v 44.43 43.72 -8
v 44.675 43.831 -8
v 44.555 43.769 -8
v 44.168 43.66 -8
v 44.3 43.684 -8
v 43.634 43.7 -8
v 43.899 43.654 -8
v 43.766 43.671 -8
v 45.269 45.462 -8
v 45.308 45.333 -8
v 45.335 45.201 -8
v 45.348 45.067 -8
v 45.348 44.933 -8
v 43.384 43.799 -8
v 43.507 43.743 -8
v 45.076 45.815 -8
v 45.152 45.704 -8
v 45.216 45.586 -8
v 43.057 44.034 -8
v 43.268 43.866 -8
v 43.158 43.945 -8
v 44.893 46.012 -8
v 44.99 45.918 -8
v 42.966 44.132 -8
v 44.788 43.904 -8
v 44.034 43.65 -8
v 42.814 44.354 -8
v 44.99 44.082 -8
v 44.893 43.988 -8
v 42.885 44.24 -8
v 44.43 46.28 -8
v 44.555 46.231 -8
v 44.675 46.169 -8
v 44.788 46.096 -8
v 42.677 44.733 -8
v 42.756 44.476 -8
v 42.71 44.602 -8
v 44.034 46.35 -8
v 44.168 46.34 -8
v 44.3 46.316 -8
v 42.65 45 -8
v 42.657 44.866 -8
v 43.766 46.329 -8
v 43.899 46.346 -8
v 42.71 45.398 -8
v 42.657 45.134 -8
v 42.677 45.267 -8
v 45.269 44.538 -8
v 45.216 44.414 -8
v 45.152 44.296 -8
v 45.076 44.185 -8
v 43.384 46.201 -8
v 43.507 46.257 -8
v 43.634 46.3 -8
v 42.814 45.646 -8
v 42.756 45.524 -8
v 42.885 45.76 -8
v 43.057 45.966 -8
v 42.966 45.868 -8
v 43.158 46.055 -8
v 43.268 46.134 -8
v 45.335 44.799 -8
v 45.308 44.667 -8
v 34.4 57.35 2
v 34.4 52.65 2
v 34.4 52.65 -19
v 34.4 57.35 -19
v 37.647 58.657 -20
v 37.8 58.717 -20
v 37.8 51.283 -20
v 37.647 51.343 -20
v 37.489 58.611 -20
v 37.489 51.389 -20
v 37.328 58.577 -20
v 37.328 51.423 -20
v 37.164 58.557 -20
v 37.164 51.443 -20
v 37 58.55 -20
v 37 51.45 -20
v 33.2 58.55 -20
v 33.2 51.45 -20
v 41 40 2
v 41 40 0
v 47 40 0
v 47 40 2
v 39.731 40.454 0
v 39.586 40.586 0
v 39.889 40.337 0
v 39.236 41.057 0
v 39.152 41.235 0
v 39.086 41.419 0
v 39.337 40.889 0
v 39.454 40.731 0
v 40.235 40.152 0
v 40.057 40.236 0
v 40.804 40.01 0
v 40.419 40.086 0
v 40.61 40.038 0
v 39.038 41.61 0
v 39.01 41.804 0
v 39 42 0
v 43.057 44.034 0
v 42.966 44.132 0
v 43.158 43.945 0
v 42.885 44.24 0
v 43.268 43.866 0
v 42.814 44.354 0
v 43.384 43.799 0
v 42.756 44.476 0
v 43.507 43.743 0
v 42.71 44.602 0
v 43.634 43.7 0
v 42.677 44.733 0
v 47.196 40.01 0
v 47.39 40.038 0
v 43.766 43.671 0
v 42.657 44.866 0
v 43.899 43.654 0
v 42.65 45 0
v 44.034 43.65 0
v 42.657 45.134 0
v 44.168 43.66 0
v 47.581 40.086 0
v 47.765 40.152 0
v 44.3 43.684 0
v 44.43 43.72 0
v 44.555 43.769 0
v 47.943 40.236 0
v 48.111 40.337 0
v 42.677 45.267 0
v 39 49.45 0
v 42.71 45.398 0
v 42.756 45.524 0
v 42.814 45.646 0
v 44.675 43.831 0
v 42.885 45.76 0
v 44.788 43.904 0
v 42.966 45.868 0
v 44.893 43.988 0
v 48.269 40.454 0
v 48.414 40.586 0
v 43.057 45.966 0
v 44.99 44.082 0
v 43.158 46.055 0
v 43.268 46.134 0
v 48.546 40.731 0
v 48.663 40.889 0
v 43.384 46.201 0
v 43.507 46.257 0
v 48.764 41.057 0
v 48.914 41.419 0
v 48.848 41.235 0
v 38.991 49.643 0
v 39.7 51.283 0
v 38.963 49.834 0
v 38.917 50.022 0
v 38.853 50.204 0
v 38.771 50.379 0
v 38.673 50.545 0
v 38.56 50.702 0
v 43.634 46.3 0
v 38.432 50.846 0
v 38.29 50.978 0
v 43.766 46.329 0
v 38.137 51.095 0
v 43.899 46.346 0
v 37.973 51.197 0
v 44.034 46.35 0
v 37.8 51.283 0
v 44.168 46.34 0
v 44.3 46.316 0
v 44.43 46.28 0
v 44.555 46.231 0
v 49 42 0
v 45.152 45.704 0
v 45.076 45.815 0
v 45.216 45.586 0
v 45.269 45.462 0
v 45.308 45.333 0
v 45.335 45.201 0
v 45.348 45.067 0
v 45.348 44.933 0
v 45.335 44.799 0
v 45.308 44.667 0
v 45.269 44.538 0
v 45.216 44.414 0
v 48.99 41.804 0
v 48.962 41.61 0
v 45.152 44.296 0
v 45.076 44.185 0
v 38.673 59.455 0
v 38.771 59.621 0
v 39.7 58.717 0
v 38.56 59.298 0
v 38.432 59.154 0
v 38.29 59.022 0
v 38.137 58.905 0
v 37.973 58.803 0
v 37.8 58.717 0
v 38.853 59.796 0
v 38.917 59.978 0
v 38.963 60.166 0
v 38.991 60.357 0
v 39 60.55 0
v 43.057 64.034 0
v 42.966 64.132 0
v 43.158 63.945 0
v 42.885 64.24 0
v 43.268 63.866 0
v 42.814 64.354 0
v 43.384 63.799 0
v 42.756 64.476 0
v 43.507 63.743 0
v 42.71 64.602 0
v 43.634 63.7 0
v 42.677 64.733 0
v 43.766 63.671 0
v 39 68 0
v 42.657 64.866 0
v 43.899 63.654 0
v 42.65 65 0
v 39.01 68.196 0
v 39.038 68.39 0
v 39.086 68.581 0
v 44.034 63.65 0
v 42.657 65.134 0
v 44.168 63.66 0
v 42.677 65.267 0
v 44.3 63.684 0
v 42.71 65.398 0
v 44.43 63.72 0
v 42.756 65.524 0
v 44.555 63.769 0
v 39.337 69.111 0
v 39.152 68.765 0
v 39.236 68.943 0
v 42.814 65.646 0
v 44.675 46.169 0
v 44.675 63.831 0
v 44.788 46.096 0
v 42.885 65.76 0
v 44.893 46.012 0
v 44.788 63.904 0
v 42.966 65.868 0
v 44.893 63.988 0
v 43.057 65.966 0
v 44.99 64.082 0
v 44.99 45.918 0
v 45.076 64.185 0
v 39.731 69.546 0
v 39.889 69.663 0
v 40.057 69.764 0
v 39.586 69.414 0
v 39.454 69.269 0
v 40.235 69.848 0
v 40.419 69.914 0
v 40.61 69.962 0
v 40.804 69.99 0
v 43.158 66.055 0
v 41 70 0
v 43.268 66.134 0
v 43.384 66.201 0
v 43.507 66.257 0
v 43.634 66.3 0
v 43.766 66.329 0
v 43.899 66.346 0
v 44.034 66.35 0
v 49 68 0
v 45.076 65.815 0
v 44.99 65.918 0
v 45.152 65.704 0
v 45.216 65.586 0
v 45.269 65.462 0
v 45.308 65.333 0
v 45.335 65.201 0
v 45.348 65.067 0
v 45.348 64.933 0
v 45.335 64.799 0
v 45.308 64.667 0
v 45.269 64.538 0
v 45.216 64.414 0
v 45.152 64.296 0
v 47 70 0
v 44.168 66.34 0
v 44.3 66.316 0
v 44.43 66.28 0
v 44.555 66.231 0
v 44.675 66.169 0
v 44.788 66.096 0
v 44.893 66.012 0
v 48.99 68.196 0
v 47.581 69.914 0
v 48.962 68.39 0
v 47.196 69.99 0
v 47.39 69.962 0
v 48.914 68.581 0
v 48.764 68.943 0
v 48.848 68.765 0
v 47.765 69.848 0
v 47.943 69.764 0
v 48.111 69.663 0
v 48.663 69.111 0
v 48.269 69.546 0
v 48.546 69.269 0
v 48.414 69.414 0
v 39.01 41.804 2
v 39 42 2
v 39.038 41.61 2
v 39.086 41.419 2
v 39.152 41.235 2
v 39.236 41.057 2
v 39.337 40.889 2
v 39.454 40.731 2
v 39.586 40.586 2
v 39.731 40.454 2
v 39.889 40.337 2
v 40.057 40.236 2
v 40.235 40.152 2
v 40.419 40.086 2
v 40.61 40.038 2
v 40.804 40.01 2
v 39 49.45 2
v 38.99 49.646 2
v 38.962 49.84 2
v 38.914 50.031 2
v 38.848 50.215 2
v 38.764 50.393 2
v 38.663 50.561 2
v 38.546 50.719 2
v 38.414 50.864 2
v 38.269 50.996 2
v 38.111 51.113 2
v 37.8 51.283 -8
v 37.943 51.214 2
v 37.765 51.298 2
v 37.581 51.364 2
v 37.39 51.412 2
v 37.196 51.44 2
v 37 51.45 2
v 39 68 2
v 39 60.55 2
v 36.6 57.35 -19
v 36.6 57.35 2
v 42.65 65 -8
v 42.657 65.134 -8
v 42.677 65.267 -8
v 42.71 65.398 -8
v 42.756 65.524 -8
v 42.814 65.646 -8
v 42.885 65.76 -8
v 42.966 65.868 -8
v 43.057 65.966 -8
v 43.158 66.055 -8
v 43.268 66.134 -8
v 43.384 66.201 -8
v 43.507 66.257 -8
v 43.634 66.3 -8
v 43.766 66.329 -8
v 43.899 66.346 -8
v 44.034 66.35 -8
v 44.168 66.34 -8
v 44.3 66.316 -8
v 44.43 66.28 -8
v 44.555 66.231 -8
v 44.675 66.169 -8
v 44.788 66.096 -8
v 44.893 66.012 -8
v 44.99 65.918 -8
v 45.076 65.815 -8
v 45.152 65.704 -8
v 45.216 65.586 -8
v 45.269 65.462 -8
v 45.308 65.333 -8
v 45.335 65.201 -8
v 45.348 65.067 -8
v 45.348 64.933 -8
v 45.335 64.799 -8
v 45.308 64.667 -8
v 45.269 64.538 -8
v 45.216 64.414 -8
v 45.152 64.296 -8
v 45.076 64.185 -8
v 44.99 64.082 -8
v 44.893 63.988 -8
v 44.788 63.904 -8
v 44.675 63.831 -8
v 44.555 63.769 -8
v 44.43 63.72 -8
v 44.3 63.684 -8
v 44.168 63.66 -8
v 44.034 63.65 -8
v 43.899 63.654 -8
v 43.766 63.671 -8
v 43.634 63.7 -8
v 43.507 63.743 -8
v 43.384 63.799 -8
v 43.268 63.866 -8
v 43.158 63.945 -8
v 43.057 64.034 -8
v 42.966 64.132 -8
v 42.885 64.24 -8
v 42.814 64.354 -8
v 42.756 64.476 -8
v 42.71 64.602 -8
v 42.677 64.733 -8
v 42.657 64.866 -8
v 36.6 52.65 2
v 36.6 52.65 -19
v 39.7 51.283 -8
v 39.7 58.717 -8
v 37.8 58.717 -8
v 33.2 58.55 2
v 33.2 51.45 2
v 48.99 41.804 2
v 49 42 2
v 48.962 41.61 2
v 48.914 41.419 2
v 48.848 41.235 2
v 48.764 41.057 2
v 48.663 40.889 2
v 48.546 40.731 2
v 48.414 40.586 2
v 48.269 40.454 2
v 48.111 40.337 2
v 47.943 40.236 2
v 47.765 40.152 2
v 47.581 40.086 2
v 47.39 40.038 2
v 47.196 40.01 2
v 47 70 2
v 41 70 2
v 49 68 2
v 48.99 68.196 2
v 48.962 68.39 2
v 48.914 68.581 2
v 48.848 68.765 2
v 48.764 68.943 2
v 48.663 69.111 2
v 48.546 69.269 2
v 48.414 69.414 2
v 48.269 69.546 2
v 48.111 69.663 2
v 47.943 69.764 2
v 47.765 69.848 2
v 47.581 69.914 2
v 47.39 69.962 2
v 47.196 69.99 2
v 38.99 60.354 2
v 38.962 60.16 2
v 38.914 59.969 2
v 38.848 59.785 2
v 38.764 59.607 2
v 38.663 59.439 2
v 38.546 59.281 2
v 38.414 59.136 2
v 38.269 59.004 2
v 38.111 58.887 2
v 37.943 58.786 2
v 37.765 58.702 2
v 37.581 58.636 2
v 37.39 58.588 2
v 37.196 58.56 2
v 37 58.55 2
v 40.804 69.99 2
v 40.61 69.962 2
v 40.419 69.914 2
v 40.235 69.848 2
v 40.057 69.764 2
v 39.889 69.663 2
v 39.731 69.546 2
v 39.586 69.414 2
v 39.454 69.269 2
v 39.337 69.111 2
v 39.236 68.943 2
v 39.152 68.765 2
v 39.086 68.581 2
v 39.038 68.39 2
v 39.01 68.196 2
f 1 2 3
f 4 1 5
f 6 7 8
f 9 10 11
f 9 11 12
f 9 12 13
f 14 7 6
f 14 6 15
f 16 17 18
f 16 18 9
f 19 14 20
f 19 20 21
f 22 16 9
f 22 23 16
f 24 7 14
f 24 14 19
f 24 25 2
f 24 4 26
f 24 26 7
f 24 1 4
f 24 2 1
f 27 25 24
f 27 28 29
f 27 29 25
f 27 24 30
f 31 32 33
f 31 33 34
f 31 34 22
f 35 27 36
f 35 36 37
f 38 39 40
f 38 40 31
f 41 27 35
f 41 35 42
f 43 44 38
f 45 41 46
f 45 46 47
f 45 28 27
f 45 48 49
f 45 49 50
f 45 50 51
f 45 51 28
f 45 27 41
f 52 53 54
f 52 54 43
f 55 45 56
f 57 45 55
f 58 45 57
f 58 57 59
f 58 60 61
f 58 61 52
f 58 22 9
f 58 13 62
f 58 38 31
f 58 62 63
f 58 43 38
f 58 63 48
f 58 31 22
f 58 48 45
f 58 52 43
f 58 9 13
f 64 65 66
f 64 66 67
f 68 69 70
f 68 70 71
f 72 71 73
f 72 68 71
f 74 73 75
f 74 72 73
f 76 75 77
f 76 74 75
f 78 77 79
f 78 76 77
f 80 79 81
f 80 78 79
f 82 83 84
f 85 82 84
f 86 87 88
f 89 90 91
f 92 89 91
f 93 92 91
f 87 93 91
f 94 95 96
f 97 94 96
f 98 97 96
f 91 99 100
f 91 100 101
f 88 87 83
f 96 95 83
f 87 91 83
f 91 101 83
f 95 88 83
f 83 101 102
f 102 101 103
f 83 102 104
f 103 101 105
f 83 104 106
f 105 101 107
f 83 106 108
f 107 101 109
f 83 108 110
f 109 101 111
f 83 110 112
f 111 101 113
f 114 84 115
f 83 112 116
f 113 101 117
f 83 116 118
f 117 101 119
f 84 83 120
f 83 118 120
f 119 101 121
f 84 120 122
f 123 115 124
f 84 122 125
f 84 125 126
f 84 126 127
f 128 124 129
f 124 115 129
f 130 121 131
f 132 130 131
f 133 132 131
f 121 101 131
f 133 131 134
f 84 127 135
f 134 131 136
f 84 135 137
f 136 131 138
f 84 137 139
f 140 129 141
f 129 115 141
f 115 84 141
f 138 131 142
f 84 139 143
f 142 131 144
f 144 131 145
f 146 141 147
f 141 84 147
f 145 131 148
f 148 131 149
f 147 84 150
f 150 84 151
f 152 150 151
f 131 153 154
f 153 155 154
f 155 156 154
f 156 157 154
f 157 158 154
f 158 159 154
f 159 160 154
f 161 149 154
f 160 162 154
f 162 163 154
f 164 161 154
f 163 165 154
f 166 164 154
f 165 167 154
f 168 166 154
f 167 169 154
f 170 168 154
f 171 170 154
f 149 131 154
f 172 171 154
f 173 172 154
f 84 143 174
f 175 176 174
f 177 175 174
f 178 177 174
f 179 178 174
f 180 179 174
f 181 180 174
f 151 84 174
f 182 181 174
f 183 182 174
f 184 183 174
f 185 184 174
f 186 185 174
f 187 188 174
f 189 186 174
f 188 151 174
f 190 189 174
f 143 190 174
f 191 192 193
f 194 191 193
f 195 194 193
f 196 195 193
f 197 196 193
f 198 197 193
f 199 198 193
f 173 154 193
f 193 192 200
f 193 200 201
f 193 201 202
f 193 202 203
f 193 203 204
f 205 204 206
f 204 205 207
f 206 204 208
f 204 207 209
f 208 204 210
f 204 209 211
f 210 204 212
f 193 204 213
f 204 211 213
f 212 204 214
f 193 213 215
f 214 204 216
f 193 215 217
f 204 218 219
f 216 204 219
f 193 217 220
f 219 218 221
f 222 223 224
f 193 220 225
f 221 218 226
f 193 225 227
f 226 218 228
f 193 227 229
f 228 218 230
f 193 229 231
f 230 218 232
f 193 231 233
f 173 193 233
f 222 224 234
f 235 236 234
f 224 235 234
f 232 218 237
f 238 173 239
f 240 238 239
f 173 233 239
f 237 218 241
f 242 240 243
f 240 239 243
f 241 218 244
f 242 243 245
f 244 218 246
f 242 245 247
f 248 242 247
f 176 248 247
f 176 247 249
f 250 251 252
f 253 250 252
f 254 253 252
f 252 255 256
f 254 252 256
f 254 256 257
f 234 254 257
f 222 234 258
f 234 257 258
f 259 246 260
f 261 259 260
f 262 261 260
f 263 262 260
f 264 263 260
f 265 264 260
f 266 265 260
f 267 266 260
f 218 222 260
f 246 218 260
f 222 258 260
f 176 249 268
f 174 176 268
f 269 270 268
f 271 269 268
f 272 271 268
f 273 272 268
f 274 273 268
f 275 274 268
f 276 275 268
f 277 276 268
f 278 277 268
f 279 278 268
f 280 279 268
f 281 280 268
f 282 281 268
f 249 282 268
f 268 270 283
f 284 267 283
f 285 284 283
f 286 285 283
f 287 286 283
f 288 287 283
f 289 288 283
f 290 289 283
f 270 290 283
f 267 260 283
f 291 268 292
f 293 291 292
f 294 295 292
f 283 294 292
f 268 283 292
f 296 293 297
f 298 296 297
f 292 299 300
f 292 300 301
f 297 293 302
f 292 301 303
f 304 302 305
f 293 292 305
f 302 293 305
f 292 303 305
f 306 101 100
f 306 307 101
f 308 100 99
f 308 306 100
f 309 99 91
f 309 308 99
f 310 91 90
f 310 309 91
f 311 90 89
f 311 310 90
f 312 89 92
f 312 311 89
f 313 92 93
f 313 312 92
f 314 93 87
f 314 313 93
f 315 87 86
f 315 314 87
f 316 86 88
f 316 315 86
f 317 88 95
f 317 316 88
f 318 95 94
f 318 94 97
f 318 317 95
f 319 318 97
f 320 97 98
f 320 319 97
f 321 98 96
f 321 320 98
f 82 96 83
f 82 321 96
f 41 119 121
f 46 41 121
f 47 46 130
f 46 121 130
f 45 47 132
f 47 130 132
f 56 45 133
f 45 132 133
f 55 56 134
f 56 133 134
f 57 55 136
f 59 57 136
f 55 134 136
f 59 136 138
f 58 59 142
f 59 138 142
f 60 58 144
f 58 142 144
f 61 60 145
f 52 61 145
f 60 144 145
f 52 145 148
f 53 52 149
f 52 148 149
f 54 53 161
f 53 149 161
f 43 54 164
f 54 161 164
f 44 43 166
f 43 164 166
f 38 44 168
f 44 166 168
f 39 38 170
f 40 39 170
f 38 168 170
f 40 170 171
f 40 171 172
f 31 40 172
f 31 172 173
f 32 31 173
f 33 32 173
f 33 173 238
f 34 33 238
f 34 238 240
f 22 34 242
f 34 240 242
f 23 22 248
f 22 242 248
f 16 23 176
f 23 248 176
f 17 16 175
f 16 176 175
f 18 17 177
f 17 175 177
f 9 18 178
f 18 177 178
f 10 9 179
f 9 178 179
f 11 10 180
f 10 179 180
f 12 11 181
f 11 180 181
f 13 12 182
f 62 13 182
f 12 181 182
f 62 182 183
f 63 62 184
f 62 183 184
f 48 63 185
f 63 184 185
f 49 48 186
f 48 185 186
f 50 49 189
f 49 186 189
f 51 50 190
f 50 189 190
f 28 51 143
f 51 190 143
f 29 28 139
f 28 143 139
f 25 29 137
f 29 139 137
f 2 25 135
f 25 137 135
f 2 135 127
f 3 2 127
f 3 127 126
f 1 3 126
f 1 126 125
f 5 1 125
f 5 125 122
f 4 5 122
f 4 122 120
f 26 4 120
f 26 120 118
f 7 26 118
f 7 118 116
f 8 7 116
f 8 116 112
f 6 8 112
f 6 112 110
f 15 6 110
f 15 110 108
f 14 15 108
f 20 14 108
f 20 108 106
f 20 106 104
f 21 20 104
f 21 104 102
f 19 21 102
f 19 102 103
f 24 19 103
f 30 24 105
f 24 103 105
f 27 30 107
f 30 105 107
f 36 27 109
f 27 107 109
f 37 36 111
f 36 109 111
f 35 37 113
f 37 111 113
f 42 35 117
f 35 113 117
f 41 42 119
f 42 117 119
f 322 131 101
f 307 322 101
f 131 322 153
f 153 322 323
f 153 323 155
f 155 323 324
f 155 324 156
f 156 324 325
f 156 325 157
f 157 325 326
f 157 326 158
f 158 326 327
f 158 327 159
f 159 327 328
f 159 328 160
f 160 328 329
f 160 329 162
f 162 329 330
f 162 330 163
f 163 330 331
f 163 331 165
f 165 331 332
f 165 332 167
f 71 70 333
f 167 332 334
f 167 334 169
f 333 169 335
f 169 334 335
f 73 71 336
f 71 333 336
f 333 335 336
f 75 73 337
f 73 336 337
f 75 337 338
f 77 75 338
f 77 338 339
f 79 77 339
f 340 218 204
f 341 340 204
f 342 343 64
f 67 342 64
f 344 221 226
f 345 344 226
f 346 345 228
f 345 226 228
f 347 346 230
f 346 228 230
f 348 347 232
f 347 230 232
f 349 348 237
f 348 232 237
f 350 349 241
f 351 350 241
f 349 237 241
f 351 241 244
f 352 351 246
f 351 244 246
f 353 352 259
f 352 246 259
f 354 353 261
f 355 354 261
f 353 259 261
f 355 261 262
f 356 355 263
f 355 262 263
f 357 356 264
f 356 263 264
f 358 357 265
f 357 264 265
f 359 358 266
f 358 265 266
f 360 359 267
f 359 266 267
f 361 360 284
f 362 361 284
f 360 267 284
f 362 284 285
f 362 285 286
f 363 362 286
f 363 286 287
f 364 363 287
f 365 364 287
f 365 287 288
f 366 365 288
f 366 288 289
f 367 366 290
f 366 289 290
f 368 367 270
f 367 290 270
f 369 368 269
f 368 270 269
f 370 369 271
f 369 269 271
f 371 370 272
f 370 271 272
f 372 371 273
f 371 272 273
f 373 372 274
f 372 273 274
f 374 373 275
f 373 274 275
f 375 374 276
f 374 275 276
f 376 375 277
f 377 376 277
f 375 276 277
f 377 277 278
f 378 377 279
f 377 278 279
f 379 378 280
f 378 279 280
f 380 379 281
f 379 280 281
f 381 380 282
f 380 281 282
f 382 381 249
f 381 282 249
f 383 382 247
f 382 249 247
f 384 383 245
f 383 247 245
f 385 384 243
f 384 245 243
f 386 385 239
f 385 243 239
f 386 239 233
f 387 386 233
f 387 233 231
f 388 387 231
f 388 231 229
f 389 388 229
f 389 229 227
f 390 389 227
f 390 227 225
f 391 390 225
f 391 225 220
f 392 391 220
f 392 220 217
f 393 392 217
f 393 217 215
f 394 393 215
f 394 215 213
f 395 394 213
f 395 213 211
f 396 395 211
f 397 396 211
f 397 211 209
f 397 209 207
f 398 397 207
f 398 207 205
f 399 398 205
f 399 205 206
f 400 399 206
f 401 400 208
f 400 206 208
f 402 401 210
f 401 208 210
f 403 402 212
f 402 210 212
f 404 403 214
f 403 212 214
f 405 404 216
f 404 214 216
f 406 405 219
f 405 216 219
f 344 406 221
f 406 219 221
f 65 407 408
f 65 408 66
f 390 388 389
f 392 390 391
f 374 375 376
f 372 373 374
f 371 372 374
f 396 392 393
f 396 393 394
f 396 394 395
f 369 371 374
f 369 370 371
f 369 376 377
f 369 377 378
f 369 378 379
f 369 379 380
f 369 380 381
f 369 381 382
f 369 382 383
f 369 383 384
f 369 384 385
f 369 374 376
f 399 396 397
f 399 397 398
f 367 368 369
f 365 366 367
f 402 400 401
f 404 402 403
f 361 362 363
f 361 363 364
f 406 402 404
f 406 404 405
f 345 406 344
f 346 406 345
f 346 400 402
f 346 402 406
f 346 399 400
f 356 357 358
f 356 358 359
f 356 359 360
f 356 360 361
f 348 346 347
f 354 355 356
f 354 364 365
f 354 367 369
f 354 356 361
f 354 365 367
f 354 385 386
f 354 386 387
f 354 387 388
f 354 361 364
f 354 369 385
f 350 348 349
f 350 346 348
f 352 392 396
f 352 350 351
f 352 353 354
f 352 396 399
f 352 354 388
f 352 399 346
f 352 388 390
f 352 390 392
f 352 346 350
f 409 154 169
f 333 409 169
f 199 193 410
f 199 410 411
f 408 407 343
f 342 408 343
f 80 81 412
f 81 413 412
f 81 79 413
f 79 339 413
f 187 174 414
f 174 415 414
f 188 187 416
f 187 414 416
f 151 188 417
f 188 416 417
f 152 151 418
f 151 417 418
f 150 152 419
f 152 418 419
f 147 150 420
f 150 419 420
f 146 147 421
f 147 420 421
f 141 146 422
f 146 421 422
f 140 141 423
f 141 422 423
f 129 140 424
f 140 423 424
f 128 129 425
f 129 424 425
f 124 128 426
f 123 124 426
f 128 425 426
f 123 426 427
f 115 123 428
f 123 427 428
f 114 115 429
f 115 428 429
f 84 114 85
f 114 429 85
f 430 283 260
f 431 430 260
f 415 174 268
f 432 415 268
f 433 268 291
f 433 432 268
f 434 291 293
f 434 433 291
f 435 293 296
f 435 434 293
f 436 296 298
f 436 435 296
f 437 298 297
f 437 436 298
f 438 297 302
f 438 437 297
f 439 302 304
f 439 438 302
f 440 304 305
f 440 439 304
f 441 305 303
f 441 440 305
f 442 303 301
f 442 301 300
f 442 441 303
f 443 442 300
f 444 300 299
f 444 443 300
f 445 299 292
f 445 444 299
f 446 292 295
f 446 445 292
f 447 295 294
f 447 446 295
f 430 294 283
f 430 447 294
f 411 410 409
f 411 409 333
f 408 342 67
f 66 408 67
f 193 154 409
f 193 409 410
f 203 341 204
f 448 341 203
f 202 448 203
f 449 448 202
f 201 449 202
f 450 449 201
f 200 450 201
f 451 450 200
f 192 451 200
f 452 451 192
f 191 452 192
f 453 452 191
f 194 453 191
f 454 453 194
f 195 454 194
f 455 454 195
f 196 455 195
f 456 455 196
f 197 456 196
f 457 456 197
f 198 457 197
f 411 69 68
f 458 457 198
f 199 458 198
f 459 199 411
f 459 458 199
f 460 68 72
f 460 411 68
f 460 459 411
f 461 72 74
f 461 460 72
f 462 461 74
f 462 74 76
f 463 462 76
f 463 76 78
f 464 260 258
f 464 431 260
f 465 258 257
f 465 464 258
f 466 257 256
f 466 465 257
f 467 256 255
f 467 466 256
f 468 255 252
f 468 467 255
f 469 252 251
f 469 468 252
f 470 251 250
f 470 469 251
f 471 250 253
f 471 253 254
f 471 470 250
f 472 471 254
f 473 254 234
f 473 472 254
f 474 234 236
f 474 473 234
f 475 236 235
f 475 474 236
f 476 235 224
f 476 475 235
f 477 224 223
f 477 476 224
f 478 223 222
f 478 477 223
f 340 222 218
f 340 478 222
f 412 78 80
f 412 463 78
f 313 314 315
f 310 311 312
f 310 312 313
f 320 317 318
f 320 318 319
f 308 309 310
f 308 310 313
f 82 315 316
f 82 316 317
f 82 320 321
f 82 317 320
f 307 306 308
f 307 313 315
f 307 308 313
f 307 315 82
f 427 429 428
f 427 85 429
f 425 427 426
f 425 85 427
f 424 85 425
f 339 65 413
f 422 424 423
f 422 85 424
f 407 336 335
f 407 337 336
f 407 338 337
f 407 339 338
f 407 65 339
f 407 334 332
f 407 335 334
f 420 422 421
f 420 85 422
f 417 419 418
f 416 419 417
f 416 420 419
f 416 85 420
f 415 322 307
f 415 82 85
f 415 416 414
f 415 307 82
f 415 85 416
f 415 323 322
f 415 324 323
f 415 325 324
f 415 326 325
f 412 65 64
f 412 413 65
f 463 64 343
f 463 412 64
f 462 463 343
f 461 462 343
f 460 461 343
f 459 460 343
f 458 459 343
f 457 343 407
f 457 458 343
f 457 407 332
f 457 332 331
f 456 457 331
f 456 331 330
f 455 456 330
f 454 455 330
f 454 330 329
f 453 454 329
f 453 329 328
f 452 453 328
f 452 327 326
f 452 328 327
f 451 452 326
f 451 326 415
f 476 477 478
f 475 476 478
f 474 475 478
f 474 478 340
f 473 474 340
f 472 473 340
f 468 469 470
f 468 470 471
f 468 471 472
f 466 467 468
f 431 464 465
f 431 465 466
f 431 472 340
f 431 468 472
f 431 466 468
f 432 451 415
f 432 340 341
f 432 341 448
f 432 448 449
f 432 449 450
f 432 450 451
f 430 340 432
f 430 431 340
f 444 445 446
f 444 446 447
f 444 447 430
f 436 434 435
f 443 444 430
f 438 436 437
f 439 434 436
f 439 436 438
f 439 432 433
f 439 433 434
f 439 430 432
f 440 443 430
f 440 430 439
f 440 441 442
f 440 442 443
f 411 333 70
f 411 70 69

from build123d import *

# Parameters (mm, degrees)
SKETCH1_W           = 2.2
SKETCH1_H           = 4.7
BOSS_EXTRUDE1_DEPTH = 2
SKETCH2_W           = 4.6
SKETCH2_H           = 7.1
SKETCH2_W_2         = 2.2
SKETCH2_H_2         = 4.7
BOSS_EXTRUDE2_DEPTH = 20
SKETCH3_W           = 2.2
SKETCH3_H           = 4.7
BOSS_EXTRUDE3_DEPTH = 1
SKETCH5_R           = 1.35
BOSS_EXTRUDE4_DEPTH = 8
FILLET1_R           = 2
SKETCH6_W           = 1.9
SKETCH6_H           = 7.433939444
BOSS_EXTRUDE5_DEPTH = 8


with BuildPart() as part:
    # Sketch1 → Boss-Extrude1 (new body)
    with BuildSketch(Plane.XY):
        Polygon((49, 70), (39, 70), (39, 58.55), (33.2, 58.55), (33.2, 51.45), (39, 51.45), (39, 40), (49, 40), align=None)
        with Locations((35.5, 55)):
            Rectangle(SKETCH1_W, SKETCH1_H, mode=Mode.SUBTRACT)
    extrude(amount=BOSS_EXTRUDE1_DEPTH)

    # Sketch2 → Boss-Extrude2 (add)
    with BuildSketch(Plane(origin=(0, 0, 0), x_dir=(-1, 0, 0), z_dir=(0, 0, -1))):
        with Locations((-35.5, 55)):
            Rectangle(SKETCH2_W, SKETCH2_H)
        with Locations((-35.5, 55)):
            Rectangle(SKETCH2_W_2, SKETCH2_H_2, mode=Mode.SUBTRACT)
    extrude(amount=BOSS_EXTRUDE2_DEPTH)

    # Sketch3 → Boss-Extrude3 (add)
    with BuildSketch(Plane(origin=(0, 0, -20), x_dir=(-1, 0, 0), z_dir=(0, 0, -1))):
        with Locations((-35.5, 55)):
            Rectangle(SKETCH3_W, SKETCH3_H)
    extrude(amount=-BOSS_EXTRUDE3_DEPTH)

    # Sketch5 → Boss-Extrude4 (add)
    with BuildSketch(Plane(origin=(0, 0, 0), x_dir=(-1, 0, 0), z_dir=(0, 0, -1))):
        with Locations((-44, 45)):
            Circle(SKETCH5_R)
        with Locations((-44, 65)):
            Circle(SKETCH5_R)
    extrude(amount=BOSS_EXTRUDE4_DEPTH)

    # Fillet1
    fillet1_edges = [part.edges().sort_by_distance(p)[0] for p in [
        (49, 70, 1),
    ]]
    fillet(fillet1_edges, radius=FILLET1_R)
    fillet1_2_edges = [part.edges().sort_by_distance(p)[0] for p in [
        (39, 70, 1),
    ]]
    fillet(fillet1_2_edges, radius=FILLET1_R)
    fillet1_3_edges = [part.edges().sort_by_distance(p)[0] for p in [
        (49, 40, 1),
    ]]
    fillet(fillet1_3_edges, radius=FILLET1_R)
    fillet1_4_edges = [part.edges().sort_by_distance(p)[0] for p in [
        (39, 58.55, 1),
    ]]
    fillet(fillet1_4_edges, radius=FILLET1_R)
    fillet1_5_edges = [part.edges().sort_by_distance(p)[0] for p in [
        (39, 40, 1),
    ]]
    fillet(fillet1_5_edges, radius=FILLET1_R)
    fillet1_6_edges = [part.edges().sort_by_distance(p)[0] for p in [
        (39, 51.45, 1),
    ]]
    fillet(fillet1_6_edges, radius=FILLET1_R)

    # Sketch6 → Boss-Extrude5 (add)
    with BuildSketch(Plane(origin=(0, 0, 0), x_dir=(-1, 0, 0), z_dir=(0, 0, -1))):
        with Locations((-38.75, 55)):
            Rectangle(SKETCH6_W, SKETCH6_H)
    extrude(amount=BOSS_EXTRUDE5_DEPTH)


solid = part.part
